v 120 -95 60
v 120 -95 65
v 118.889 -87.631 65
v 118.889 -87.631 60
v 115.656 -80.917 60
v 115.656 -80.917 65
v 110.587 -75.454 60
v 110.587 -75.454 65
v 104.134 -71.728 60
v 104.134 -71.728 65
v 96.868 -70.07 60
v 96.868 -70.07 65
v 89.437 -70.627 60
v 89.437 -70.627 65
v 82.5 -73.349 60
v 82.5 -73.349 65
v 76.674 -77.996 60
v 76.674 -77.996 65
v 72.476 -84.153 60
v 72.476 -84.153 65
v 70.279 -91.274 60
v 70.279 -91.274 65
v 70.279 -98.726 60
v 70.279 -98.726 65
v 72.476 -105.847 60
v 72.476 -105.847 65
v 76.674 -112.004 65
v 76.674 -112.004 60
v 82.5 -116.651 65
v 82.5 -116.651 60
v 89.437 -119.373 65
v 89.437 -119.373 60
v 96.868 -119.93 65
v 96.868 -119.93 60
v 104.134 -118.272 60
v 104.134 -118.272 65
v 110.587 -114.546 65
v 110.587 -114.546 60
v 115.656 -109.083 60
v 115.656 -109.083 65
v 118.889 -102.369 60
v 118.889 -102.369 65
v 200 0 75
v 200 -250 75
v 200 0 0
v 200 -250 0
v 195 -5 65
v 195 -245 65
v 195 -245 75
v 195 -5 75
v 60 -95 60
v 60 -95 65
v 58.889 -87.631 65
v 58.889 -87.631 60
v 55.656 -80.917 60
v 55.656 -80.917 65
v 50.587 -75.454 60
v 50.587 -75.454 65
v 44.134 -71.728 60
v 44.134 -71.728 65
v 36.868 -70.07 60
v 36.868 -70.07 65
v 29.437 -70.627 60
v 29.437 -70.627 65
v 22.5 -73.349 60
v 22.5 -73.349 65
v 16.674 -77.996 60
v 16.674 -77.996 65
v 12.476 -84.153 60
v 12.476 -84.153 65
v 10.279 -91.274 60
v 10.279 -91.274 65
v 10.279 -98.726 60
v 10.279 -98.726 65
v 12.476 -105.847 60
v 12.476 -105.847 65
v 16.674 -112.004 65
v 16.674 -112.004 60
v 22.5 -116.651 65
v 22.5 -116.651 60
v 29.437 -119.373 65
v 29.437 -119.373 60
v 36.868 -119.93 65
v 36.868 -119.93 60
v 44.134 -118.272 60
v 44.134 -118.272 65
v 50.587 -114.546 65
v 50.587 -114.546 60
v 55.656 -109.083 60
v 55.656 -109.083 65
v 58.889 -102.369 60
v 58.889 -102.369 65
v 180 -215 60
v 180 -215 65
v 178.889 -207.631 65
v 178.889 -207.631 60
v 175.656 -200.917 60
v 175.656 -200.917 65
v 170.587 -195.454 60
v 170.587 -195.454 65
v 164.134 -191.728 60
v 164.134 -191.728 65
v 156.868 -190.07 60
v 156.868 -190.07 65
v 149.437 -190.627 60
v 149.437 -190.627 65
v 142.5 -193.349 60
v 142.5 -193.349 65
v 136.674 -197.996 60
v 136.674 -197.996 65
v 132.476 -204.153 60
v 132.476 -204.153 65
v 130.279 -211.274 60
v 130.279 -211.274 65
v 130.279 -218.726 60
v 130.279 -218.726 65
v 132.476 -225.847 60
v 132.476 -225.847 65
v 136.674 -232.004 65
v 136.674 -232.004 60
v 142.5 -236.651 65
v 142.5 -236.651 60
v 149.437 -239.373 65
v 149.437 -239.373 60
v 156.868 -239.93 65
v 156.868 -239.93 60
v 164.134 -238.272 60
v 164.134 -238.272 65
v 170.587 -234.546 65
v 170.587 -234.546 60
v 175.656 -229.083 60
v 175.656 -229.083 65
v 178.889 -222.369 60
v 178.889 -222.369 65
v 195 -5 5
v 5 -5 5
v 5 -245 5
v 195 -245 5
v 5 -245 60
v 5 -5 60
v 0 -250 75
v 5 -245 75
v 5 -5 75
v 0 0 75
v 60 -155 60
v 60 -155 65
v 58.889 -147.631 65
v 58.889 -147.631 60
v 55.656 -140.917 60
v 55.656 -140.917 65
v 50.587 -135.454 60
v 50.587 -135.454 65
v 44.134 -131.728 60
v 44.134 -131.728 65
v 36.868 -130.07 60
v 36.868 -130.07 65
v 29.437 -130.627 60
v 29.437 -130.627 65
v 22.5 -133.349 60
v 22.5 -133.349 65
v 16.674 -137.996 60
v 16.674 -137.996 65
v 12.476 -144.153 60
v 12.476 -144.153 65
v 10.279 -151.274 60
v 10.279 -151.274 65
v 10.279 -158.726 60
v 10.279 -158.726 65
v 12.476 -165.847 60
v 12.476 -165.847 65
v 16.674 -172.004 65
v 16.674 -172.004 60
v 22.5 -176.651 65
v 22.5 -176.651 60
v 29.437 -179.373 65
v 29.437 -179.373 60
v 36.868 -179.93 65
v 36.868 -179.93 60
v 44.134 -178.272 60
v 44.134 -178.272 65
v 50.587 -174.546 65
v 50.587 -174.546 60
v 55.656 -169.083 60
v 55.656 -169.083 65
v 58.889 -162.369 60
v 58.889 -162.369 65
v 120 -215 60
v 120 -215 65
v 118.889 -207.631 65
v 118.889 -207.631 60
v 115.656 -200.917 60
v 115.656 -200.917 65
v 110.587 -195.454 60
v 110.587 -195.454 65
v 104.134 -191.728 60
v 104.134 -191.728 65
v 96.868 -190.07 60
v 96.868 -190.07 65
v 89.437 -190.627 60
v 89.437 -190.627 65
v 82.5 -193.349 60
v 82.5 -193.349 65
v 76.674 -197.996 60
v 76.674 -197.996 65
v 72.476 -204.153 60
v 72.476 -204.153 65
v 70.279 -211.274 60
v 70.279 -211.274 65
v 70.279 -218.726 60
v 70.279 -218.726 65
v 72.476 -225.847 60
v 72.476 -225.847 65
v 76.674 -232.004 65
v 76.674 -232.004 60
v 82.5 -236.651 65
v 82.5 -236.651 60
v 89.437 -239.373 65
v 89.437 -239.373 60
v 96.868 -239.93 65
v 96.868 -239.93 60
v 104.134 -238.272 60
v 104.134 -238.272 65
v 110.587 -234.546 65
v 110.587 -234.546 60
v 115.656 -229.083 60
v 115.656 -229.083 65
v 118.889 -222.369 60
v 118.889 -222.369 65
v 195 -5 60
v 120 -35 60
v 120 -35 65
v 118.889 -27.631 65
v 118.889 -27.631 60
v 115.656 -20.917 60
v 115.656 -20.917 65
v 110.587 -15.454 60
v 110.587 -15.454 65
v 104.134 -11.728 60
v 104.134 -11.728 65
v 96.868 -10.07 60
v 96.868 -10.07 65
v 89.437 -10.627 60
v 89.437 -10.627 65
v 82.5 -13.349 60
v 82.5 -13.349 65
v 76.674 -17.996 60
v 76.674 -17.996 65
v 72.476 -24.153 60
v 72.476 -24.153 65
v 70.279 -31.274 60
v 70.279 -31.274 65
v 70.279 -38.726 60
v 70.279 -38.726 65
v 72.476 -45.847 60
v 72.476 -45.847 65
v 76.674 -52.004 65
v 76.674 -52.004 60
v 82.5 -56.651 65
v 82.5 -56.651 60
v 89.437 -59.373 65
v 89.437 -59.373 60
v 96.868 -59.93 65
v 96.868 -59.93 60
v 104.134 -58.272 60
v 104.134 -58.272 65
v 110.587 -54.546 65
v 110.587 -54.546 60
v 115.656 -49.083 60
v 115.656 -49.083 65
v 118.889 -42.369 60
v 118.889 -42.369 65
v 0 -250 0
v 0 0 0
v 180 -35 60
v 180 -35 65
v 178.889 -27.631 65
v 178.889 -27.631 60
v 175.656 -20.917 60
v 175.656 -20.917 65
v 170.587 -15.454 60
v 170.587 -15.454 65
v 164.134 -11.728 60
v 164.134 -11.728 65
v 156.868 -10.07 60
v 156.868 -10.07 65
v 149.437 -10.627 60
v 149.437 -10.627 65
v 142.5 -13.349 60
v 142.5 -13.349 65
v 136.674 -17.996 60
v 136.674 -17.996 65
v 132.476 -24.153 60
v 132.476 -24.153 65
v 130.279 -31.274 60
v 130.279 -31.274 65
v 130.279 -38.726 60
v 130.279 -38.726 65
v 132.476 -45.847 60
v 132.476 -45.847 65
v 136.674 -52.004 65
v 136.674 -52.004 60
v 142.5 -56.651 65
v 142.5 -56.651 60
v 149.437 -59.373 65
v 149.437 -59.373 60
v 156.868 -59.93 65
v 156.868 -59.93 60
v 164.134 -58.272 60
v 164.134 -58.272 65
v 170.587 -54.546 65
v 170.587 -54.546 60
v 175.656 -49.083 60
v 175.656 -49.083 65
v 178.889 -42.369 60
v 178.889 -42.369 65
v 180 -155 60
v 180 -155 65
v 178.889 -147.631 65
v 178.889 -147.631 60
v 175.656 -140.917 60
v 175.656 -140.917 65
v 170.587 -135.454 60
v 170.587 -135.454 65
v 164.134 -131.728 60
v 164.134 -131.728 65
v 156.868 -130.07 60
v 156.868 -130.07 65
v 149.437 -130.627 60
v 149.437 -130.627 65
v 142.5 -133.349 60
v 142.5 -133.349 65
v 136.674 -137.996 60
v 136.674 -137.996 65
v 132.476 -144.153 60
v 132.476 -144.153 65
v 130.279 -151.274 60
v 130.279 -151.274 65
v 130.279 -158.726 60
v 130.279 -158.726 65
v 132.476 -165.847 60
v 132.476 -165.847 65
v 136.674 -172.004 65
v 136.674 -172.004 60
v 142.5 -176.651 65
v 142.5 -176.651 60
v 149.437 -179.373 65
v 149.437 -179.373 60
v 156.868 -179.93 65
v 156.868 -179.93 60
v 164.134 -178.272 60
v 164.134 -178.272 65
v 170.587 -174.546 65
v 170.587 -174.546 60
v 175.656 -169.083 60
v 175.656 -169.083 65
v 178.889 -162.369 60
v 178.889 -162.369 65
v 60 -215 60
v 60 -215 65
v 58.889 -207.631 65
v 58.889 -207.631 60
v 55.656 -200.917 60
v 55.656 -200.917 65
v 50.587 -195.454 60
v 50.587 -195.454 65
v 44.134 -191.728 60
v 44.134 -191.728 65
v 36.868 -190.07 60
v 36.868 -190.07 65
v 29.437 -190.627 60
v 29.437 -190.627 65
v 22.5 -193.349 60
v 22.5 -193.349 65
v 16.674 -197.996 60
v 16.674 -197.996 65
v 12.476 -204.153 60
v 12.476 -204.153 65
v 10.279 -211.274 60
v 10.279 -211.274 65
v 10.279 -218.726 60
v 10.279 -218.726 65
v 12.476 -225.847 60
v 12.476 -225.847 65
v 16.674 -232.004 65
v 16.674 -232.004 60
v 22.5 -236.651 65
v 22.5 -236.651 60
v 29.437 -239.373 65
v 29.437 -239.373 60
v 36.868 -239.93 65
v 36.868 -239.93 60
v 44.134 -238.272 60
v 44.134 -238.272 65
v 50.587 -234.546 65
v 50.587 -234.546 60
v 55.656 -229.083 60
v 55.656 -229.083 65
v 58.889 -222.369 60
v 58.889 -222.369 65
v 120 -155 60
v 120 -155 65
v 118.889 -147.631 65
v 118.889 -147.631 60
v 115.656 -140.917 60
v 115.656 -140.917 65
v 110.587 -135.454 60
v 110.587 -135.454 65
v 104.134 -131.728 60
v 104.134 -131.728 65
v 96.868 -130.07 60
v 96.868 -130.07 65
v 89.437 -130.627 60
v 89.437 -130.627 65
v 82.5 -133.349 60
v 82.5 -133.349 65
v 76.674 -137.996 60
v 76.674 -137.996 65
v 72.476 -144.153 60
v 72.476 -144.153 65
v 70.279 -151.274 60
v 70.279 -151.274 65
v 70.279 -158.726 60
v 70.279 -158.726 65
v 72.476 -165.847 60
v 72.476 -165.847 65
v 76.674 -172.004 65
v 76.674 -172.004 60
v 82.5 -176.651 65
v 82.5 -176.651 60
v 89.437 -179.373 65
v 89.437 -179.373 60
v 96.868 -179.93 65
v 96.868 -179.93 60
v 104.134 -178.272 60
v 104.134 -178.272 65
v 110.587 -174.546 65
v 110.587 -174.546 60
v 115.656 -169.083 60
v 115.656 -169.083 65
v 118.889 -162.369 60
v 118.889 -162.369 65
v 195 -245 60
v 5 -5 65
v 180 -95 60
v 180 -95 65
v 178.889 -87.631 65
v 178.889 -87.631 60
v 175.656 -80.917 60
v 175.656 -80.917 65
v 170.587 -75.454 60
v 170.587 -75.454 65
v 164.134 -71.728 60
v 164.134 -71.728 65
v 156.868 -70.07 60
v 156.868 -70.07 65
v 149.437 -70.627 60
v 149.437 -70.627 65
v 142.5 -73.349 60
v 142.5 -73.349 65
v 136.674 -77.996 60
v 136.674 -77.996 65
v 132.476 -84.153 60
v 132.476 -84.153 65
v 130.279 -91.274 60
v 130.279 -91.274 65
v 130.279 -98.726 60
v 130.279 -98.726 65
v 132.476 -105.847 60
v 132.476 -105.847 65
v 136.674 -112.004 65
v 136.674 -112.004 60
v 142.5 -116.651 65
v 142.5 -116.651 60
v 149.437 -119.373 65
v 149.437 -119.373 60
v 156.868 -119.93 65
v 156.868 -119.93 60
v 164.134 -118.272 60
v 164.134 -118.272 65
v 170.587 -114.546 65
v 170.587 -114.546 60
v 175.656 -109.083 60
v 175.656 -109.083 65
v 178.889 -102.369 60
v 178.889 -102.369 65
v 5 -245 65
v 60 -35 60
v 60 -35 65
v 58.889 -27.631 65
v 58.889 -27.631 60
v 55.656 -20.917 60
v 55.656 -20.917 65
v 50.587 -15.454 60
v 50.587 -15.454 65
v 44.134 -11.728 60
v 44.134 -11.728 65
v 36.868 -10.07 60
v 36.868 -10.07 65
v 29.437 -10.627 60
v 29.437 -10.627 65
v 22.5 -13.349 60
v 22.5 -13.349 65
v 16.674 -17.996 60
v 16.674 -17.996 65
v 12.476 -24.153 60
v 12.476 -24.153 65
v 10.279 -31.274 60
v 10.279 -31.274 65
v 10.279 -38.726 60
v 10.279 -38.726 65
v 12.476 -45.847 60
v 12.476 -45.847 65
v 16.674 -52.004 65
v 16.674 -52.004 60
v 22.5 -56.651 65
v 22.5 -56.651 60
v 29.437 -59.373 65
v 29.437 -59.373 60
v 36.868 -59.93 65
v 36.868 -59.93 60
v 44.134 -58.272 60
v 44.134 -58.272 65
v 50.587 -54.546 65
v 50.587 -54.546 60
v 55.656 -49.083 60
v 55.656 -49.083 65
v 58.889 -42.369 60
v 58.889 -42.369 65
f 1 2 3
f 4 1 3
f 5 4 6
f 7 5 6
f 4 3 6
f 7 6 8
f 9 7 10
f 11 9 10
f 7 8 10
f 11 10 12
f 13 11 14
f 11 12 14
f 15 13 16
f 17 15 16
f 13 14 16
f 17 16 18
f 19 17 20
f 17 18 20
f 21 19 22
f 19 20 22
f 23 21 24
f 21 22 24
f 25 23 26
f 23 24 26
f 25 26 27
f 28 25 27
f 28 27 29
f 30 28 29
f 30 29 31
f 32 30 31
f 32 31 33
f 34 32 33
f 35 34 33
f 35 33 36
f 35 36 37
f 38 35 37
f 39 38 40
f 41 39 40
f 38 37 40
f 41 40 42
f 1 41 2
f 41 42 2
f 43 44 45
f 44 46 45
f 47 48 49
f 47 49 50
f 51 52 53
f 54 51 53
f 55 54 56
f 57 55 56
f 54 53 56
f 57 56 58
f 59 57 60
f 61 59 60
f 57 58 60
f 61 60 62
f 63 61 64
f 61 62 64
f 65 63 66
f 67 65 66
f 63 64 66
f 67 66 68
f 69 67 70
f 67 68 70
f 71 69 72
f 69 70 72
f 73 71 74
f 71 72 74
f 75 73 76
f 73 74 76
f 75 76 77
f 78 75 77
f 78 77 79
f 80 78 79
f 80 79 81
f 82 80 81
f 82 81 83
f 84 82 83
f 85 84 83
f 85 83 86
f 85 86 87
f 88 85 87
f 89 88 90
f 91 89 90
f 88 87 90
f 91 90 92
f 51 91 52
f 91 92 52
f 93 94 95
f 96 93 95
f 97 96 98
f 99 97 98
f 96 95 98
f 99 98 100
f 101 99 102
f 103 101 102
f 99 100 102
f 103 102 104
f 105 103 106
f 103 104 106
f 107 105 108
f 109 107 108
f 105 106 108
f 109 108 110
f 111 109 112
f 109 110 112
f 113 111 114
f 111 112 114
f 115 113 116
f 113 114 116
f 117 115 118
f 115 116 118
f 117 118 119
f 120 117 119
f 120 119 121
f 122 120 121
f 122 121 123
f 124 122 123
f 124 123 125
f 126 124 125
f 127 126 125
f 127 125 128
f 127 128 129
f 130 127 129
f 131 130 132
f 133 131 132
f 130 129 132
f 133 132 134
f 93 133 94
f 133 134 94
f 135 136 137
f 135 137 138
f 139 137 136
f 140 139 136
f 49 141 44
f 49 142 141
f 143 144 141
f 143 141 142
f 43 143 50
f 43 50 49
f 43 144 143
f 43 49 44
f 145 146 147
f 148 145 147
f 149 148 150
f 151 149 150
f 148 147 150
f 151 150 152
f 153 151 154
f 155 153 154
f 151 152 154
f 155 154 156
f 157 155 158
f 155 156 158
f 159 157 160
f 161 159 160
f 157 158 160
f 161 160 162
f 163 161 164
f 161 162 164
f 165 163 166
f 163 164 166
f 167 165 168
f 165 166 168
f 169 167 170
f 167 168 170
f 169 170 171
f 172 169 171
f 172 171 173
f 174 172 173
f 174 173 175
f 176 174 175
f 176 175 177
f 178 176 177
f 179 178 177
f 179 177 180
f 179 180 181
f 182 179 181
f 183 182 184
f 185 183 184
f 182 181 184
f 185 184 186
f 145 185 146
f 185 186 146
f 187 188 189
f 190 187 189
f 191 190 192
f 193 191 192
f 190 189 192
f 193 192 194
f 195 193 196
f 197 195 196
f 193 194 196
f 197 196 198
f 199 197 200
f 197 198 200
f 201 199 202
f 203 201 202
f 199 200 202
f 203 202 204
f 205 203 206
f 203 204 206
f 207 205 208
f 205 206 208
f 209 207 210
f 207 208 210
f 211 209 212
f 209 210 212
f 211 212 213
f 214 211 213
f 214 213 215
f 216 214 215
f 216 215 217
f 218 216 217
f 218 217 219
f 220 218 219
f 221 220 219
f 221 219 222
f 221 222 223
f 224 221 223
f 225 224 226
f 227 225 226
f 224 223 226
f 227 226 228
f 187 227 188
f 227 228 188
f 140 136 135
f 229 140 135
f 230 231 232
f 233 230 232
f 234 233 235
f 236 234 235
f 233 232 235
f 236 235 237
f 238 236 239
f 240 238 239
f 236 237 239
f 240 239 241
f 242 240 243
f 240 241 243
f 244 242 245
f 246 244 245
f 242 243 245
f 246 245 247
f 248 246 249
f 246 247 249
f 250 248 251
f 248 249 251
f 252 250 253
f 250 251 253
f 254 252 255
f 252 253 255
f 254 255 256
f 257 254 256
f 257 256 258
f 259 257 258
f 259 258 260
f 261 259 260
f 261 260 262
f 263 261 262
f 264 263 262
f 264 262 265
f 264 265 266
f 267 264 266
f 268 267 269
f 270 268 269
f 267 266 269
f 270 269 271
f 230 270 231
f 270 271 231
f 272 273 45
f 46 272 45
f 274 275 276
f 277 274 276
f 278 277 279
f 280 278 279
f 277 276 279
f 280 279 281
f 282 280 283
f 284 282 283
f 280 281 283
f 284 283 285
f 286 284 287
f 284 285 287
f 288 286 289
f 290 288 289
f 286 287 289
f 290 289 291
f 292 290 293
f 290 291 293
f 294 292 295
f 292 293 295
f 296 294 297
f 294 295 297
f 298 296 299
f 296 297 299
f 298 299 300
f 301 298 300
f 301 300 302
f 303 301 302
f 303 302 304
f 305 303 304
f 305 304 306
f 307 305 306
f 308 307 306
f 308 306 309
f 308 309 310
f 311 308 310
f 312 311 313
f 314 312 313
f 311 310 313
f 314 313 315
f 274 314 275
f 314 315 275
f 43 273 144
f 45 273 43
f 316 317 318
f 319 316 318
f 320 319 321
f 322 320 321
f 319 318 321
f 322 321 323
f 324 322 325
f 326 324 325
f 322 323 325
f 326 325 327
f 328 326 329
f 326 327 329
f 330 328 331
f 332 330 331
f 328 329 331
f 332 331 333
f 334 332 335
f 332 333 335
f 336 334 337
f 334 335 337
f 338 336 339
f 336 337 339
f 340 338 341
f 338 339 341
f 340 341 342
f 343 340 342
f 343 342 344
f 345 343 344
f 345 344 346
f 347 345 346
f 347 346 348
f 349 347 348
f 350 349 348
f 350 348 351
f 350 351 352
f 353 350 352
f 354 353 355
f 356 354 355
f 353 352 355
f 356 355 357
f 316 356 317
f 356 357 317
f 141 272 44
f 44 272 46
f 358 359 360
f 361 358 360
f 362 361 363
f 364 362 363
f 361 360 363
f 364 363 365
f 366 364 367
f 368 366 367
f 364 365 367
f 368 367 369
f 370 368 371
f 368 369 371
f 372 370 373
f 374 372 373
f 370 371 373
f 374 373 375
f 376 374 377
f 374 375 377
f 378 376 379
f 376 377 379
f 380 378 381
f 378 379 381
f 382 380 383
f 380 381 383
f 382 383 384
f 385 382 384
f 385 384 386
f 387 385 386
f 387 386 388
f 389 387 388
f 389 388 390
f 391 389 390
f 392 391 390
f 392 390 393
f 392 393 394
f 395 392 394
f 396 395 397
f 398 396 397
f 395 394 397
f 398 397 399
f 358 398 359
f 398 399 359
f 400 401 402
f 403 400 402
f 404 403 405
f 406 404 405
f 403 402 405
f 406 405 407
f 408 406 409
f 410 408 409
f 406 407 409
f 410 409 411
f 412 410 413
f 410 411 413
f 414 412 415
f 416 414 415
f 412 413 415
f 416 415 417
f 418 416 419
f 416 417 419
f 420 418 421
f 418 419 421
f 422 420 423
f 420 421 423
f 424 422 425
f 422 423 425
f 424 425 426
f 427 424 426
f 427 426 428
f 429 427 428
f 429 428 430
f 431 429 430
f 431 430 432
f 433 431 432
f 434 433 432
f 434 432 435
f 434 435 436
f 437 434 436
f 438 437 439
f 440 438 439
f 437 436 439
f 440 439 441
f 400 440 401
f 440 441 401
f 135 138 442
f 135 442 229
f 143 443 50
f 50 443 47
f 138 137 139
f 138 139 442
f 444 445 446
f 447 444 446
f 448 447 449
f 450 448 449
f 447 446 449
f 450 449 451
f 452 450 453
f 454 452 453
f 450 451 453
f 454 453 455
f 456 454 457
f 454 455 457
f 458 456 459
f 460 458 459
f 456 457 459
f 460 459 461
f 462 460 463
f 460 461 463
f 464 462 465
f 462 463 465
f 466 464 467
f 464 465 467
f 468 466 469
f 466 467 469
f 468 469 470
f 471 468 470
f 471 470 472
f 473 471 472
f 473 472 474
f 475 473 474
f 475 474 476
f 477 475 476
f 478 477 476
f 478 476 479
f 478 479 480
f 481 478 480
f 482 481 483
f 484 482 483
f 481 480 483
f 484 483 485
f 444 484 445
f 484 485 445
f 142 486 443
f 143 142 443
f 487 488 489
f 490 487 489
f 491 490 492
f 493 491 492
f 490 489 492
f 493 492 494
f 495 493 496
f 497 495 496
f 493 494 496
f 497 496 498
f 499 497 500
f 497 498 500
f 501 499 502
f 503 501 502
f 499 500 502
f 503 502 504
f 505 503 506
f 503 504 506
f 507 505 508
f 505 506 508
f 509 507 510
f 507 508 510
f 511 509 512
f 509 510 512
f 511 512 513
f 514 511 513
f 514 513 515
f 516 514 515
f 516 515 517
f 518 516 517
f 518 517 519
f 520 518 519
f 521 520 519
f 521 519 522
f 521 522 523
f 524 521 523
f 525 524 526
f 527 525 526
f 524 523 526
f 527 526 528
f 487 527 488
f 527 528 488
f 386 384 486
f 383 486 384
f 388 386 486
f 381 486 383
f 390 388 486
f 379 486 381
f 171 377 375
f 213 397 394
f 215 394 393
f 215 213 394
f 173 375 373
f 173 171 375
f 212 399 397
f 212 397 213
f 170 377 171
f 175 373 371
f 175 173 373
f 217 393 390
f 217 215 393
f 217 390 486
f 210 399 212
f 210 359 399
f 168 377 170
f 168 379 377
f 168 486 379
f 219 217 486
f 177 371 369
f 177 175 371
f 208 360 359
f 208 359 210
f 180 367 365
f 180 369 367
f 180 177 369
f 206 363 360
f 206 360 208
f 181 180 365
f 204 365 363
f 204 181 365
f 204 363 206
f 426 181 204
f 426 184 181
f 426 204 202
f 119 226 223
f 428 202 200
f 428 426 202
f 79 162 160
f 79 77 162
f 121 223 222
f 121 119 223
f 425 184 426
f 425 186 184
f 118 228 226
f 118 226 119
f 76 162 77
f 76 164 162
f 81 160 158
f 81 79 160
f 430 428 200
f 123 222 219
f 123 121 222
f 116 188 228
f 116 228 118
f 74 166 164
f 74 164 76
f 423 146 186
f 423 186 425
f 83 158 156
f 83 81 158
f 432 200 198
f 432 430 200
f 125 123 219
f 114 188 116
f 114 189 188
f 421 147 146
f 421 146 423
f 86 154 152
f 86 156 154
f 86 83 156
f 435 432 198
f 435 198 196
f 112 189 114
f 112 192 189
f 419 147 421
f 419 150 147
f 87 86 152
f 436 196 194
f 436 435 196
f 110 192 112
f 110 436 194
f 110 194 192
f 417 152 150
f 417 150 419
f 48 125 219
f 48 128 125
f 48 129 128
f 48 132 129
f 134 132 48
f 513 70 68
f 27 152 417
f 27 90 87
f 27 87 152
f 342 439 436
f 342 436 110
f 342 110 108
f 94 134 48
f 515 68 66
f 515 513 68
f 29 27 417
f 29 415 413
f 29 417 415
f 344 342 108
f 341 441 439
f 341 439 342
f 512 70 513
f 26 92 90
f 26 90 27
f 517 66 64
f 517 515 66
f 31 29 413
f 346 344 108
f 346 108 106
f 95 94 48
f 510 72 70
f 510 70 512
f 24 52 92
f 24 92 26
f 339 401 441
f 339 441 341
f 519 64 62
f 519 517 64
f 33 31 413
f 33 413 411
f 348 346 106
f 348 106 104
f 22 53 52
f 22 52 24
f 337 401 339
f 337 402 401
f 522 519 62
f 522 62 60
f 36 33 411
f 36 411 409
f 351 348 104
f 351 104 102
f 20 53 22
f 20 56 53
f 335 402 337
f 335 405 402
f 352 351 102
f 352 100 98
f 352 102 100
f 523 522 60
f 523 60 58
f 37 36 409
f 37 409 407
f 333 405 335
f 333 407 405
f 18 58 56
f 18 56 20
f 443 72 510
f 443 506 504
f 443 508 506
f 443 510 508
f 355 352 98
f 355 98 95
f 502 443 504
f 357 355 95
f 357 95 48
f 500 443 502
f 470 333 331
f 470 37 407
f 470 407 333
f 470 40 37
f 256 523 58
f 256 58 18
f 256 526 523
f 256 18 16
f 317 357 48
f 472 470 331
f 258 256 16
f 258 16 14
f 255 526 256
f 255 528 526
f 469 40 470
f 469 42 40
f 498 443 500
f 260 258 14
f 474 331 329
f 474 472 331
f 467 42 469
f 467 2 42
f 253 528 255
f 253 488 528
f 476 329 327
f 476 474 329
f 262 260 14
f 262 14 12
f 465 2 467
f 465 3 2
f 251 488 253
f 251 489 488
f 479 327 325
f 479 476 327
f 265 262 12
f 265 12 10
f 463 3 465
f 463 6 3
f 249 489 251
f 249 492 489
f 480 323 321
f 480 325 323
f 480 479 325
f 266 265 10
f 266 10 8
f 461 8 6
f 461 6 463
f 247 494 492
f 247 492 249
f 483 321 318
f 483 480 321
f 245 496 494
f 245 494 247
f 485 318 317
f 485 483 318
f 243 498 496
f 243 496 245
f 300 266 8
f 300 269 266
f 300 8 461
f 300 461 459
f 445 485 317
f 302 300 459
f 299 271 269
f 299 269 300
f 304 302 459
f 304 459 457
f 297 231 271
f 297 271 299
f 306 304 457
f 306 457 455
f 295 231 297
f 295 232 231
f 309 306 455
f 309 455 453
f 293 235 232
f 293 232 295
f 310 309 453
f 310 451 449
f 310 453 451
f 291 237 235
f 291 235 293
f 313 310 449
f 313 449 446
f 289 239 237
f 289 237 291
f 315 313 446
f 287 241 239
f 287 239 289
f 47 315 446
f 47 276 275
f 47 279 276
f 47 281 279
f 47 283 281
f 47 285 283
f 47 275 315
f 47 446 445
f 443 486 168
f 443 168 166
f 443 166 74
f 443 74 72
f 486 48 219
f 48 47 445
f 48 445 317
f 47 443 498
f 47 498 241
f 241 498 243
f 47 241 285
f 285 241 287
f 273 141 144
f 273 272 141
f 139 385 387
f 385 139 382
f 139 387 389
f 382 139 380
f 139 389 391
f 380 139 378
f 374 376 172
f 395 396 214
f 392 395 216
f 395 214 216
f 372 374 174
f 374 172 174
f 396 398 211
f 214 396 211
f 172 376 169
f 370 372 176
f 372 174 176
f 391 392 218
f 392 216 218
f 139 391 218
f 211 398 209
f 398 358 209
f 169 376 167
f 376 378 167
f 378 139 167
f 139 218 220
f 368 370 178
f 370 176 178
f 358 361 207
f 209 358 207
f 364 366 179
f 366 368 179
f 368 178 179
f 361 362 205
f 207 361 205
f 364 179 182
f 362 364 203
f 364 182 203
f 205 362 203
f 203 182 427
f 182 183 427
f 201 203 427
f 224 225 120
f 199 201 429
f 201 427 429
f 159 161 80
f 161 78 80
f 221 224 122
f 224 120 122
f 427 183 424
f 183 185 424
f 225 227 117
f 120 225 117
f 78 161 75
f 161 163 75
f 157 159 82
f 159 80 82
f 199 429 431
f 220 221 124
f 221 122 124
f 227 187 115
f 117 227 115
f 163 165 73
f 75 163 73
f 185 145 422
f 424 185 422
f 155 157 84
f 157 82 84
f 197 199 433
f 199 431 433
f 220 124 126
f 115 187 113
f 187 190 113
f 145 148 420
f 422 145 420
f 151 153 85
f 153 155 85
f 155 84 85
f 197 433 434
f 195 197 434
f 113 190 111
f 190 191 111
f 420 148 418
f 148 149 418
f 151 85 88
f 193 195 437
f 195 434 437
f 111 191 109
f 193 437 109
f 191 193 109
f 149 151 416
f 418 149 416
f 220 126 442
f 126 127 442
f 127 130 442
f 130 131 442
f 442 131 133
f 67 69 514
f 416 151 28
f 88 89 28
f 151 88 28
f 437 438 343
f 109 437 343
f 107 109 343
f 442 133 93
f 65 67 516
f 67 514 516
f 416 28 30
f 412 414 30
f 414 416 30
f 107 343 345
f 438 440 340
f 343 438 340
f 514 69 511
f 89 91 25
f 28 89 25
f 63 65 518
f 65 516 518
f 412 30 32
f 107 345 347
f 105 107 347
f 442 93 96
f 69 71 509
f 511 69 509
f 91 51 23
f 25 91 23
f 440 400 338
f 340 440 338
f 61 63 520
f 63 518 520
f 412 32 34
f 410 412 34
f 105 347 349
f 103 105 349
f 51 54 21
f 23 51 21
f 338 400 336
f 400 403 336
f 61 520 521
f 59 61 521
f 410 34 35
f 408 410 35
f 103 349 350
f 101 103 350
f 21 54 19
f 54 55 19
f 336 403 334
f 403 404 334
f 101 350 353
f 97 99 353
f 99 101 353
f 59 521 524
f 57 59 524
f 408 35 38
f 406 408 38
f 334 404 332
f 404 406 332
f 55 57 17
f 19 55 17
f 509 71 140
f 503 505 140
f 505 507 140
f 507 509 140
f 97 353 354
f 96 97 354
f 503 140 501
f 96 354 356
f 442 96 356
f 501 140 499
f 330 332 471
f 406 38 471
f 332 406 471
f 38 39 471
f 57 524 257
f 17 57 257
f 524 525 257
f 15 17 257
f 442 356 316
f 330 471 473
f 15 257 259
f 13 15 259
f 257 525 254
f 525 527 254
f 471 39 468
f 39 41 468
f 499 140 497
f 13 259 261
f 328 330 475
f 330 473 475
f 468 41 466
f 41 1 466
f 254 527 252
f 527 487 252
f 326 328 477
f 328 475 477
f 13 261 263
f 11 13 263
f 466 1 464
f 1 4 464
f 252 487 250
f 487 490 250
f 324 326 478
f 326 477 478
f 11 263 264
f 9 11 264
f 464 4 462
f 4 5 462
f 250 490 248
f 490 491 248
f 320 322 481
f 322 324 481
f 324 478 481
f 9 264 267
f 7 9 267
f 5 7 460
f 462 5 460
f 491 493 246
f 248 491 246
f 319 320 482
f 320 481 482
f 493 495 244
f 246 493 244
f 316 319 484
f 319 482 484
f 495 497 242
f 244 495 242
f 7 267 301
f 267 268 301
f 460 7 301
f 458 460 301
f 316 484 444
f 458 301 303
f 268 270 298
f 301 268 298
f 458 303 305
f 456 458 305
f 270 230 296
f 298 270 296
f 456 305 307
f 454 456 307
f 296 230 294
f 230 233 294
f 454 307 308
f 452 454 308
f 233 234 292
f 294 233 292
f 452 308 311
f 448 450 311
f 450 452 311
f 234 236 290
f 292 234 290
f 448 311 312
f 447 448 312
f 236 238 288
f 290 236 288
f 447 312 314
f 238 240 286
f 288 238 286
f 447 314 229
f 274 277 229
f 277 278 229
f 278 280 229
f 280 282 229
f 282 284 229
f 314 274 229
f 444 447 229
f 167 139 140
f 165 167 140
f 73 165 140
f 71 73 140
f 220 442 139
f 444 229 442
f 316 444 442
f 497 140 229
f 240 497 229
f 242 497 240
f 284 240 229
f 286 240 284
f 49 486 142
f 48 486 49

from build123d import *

# Parameters (mm, degrees)
SKETCH1_W           = 200
SKETCH1_H           = 250
BOSS_EXTRUDE1_DEPTH = 5
SKETCH2_W           = 200
SKETCH2_H           = 250
SKETCH2_W_2         = 190
SKETCH2_H_2         = 240
BOSS_EXTRUDE2_DEPTH = 70
BOSS_EXTRUDE3_START = -15
SKETCH3_W           = 190
SKETCH3_H           = 240
BOSS_EXTRUDE3_DEPTH = 5
SKETCH4_R           = 25
CUT_EXTRUDE1_DEPTH  = 5


with BuildPart() as part:
    # Sketch1 → Boss-Extrude1 (new body)
    with BuildSketch(Plane.XY):
        with Locations((100, -125)):
            Rectangle(SKETCH1_W, SKETCH1_H)
    extrude(amount=BOSS_EXTRUDE1_DEPTH)

    # Sketch2 → Boss-Extrude2 (add)
    with BuildSketch(Plane.XY.offset(5)):
        with Locations((100, -125)):
            Rectangle(SKETCH2_W, SKETCH2_H)
        with Locations((100, -125)):
            Rectangle(SKETCH2_W_2, SKETCH2_H_2, mode=Mode.SUBTRACT)
    extrude(amount=BOSS_EXTRUDE2_DEPTH)

    # Sketch3 → Boss-Extrude3 (add)
    with BuildSketch(Plane.XY.offset(75).offset(BOSS_EXTRUDE3_START)):
        with Locations((100, -125)):
            Rectangle(SKETCH3_W, SKETCH3_H)
    extrude(amount=BOSS_EXTRUDE3_DEPTH)

    # Sketch4 → Cut-Extrude1 (cut)
    with BuildSketch(Plane.XY.offset(65)):
        with Locations((35, -35)):
            Circle(SKETCH4_R)
        with Locations((95, -35)):
            Circle(SKETCH4_R)
        with Locations((155, -35)):
            Circle(SKETCH4_R)
        with Locations((95, -95)):
            Circle(SKETCH4_R)
        with Locations((155, -95)):
            Circle(SKETCH4_R)
        with Locations((95, -155)):
            Circle(SKETCH4_R)
        with Locations((155, -155)):
            Circle(SKETCH4_R)
        with Locations((95, -215)):
            Circle(SKETCH4_R)
        with Locations((155, -215)):
            Circle(SKETCH4_R)
        with Locations((35, -95)):
            Circle(SKETCH4_R)
        with Locations((35, -155)):
            Circle(SKETCH4_R)
        with Locations((35, -215)):
            Circle(SKETCH4_R)
    extrude(amount=-CUT_EXTRUDE1_DEPTH, mode=Mode.SUBTRACT)


solid = part.part
